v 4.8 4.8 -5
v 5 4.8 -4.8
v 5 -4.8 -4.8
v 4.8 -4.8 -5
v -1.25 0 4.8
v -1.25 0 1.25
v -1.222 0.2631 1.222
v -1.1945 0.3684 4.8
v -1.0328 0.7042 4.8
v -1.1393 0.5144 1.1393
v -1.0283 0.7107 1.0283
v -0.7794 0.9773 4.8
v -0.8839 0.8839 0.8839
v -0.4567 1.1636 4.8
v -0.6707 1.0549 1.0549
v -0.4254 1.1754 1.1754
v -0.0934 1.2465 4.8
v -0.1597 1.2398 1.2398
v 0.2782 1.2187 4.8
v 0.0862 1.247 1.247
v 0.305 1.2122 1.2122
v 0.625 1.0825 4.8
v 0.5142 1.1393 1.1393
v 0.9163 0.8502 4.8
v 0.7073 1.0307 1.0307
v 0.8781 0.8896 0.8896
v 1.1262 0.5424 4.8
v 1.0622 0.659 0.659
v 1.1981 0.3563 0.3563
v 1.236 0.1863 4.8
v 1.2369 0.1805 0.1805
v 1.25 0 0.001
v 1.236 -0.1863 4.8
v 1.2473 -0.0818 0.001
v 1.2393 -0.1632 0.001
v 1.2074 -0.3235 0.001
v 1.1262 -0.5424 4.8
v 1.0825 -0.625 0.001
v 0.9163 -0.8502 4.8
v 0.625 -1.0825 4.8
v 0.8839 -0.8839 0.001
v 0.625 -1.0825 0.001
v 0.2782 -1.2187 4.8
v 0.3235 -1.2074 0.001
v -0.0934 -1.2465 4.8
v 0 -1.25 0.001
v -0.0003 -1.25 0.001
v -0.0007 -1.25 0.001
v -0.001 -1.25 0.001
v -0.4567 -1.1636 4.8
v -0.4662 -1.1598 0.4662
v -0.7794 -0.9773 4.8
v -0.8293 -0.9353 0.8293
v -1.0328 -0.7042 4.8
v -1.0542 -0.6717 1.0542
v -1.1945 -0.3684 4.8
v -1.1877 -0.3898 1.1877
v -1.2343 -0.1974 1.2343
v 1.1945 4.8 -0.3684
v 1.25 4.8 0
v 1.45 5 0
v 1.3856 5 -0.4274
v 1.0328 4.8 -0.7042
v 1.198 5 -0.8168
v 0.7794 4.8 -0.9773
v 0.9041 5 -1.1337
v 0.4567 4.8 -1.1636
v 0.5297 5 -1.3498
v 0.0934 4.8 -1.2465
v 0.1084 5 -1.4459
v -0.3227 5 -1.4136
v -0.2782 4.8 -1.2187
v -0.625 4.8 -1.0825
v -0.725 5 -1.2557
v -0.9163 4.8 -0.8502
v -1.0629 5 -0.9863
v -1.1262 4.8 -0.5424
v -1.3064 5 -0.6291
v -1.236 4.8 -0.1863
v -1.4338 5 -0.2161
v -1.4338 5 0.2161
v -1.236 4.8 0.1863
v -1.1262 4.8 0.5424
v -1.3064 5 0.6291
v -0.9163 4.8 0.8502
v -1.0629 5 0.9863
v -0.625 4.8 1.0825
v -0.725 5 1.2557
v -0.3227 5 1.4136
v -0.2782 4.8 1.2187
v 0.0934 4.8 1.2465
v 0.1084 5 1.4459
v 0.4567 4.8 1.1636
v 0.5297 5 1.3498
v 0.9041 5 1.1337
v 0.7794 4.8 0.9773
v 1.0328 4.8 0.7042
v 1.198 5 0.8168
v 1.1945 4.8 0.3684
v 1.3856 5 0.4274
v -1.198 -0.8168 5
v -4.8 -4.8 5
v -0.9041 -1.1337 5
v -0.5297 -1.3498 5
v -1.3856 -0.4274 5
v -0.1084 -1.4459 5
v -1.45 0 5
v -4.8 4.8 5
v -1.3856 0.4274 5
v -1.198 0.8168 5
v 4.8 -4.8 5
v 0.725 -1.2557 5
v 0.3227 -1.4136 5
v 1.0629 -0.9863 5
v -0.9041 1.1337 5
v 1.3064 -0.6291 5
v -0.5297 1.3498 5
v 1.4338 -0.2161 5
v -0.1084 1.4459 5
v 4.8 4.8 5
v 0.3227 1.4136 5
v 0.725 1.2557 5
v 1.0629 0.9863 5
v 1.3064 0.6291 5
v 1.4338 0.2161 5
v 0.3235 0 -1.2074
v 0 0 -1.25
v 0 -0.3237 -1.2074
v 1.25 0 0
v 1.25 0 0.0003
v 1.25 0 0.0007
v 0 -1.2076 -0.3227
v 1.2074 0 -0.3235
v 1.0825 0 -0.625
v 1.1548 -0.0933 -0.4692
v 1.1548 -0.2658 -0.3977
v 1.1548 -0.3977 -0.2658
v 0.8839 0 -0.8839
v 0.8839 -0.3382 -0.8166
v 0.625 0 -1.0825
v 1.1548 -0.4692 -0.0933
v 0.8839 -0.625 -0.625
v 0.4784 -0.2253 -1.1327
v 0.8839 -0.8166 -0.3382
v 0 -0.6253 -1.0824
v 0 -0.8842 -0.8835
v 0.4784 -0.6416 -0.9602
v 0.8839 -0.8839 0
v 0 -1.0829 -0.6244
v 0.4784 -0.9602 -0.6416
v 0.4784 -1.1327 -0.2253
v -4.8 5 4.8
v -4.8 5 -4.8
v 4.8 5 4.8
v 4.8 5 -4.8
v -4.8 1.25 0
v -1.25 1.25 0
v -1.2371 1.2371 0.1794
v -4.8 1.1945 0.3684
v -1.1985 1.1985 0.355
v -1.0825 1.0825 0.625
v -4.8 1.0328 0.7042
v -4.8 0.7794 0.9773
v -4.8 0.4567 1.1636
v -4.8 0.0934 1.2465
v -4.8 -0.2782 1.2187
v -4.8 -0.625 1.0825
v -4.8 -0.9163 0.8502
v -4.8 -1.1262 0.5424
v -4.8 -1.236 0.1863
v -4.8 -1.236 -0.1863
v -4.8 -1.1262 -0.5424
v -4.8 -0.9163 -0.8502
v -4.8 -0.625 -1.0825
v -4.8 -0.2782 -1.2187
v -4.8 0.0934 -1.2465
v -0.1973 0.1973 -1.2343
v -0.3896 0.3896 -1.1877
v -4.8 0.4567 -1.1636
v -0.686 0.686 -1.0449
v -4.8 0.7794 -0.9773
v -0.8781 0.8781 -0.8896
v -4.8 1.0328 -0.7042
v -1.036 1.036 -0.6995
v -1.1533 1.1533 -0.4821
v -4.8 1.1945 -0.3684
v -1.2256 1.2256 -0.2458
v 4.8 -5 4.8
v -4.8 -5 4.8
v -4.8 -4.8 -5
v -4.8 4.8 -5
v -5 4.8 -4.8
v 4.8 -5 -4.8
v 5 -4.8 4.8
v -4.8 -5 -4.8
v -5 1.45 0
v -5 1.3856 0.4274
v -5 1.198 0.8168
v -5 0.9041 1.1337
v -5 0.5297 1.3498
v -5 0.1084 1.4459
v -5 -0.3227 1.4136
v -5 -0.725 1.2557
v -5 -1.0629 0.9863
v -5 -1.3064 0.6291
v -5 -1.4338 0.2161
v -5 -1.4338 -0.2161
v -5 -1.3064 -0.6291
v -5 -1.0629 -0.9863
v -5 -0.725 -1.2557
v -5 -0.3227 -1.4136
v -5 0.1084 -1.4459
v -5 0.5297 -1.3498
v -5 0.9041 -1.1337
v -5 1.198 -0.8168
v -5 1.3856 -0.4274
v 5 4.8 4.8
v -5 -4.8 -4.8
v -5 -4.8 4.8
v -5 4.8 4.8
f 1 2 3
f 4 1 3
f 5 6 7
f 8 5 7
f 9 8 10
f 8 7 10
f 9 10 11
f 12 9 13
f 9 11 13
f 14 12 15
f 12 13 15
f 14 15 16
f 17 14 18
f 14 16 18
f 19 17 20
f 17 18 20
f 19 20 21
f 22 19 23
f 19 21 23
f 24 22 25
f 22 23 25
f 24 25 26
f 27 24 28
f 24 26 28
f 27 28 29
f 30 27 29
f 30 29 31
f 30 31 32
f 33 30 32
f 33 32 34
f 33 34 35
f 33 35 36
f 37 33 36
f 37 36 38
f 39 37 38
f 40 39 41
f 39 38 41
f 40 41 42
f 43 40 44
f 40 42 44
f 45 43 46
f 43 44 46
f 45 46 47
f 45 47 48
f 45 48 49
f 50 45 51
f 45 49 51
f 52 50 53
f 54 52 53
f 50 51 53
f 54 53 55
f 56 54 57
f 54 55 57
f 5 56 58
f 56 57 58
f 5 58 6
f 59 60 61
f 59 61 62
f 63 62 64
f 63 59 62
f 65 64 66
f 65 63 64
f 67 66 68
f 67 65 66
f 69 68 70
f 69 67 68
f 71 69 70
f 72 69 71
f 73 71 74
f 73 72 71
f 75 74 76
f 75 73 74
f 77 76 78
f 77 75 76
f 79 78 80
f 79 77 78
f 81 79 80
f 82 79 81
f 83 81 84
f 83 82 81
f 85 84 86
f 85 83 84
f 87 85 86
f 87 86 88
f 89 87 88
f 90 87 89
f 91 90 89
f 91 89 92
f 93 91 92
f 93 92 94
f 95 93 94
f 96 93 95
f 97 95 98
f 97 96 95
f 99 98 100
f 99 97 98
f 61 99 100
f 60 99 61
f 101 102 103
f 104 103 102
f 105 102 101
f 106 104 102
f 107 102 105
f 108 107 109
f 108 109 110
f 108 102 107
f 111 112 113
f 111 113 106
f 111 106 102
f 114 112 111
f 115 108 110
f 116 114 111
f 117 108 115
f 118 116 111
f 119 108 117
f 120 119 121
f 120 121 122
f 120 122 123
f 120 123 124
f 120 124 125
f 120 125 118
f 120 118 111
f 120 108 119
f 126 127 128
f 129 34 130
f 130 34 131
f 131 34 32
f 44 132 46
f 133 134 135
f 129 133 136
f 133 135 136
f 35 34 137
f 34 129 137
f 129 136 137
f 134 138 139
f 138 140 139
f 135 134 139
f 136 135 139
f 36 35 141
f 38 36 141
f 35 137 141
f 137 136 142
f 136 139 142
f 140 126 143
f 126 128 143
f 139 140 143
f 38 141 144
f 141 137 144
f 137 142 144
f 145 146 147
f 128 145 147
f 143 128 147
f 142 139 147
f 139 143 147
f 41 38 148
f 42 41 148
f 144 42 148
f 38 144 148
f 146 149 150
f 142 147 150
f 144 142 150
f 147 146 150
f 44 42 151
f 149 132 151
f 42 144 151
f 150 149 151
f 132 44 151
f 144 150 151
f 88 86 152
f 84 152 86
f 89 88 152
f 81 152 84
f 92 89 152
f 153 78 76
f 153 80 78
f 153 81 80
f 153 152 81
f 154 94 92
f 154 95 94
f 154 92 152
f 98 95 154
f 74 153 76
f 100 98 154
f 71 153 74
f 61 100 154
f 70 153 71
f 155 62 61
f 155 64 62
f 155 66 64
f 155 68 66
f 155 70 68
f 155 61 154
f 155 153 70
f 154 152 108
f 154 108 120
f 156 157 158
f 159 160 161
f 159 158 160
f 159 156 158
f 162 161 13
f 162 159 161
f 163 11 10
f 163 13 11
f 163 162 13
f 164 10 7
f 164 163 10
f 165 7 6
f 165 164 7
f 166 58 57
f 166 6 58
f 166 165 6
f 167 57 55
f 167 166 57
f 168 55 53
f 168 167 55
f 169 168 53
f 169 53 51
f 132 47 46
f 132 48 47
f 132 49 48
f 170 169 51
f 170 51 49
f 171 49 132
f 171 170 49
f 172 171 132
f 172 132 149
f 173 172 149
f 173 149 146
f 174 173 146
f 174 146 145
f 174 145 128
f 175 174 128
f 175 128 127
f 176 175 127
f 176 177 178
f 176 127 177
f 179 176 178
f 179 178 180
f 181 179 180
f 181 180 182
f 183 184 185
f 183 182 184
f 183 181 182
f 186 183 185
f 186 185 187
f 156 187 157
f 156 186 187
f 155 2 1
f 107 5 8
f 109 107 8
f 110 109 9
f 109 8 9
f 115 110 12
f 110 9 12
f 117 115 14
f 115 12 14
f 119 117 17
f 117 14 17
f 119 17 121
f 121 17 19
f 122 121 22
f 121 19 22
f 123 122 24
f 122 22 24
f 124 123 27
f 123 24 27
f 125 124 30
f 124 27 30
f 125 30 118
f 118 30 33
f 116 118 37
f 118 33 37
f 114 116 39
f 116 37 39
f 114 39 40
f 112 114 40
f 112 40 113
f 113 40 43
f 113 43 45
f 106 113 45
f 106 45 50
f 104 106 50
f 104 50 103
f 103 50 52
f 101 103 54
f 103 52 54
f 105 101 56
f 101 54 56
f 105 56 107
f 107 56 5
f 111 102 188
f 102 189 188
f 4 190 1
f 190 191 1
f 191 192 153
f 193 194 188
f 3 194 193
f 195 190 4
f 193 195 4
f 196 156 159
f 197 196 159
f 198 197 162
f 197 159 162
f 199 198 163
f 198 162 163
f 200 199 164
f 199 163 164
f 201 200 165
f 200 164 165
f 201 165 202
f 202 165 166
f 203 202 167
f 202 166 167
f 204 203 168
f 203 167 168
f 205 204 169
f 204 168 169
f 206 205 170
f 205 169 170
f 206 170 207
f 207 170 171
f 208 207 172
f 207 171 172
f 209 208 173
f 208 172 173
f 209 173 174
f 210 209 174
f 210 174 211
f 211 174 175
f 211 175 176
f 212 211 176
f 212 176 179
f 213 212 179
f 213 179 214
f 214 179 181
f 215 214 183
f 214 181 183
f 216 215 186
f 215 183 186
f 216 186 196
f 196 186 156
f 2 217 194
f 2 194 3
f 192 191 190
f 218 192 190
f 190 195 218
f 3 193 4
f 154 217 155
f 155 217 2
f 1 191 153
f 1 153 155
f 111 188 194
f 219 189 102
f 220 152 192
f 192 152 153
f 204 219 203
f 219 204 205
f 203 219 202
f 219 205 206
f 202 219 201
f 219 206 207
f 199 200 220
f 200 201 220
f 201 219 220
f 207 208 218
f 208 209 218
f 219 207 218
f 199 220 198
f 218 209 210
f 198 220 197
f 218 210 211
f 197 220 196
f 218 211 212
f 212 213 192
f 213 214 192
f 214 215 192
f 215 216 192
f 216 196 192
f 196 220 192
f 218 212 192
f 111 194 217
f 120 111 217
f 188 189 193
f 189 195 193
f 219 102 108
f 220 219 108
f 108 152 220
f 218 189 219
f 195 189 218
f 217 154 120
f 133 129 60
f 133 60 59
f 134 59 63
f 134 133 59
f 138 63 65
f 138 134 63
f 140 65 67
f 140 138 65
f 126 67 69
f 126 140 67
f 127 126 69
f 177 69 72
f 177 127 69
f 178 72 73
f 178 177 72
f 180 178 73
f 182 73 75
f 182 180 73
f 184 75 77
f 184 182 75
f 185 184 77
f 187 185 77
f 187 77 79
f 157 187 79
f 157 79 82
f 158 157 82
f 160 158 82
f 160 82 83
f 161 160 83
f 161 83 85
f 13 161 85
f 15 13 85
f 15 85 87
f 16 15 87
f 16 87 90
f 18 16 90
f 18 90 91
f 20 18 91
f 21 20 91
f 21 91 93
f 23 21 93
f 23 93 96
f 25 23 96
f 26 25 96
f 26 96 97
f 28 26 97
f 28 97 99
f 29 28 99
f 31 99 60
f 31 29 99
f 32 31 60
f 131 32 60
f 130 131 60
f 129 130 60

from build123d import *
from OCP.BRepAlgoAPI import BRepAlgoAPI_Cut
from OCP.TopTools import TopTools_ListOfShape

# Parameters (mm, degrees)
SKETCH_1_W                 = 10
SKETCH_1_H                 = 10
EXTRUDE_1_DEPTH            = 5
HOLE_WIZARD_M3_1_D         = 2.5
HOLE_WIZARD_M3_1_DEPTH     = 4.999
HOLE_WIZARD_M3_2_OUTLINE_R = 1.25
HOLE_WIZARD_M3_2_DEPTH     = 5
HOLE_START                 = -5
HOLE_WIZARD_M3_3_OUTLINE_R = 1.25
HOLE_WIZARD_M3_3_DEPTH     = 5
CHAMFER_1_SIZE             = 0.2


with BuildPart() as part:
    # 草图1 → 凸台-拉伸1 (new, symmetric)
    with BuildSketch(Plane(origin=(0, 0, 0), x_dir=(1, 0, 0), z_dir=(0, 1, 0))):
        Rectangle(SKETCH_1_W, SKETCH_1_H)
    extrude(amount=EXTRUDE_1_DEPTH, both=True)

    # M3 螺纹孔1
    with Locations(Plane.XY.offset(5)):
        with Locations((0, 0)):
            Hole(HOLE_WIZARD_M3_1_D / 2, depth=HOLE_WIZARD_M3_1_DEPTH)


with BuildPart() as hole_wizard_m3_2_tool:
    # M3 螺纹孔2: read off the stored shape, not the designer's step
    # M3 螺纹孔2 outline → M3 螺纹孔2 (new body)
    with BuildSketch(Plane(origin=(0, 0, 0), x_dir=(1, 0, 0), z_dir=(0, 1, 0))):
        Circle(HOLE_WIZARD_M3_2_OUTLINE_R)
    extrude(amount=HOLE_WIZARD_M3_2_DEPTH)


with BuildPart() as part_1:
    add(part.part)

    # M3 螺纹孔2: cut by hole_wizard_m3_2_tool, with a tolerance
    hole_wizard_m3_2_stock = TopTools_ListOfShape()
    hole_wizard_m3_2_stock.Append(part_1.part.wrapped)
    hole_wizard_m3_2_tools = TopTools_ListOfShape()
    hole_wizard_m3_2_tools.Append(hole_wizard_m3_2_tool.part.wrapped)
    hole_wizard_m3_2_cut = BRepAlgoAPI_Cut()
    hole_wizard_m3_2_cut.SetArguments(hole_wizard_m3_2_stock)
    hole_wizard_m3_2_cut.SetTools(hole_wizard_m3_2_tools)
    hole_wizard_m3_2_cut.SetFuzzyValue(0.00001)
    hole_wizard_m3_2_cut.Build()
    add(Compound.cast(hole_wizard_m3_2_cut.Shape()).solids(), mode=Mode.REPLACE)

    # M3 螺纹孔3: read off the stored shape, not the designer's step
    # M3 螺纹孔3 outline → M3 螺纹孔3 (cut)
    with BuildSketch(Plane.YZ.offset(HOLE_START)):
        Circle(HOLE_WIZARD_M3_3_OUTLINE_R)
    extrude(amount=HOLE_WIZARD_M3_3_DEPTH, mode=Mode.SUBTRACT)

    # 草图7 → 切除-旋转1 (revolve, cut)
    with BuildSketch(Plane(origin=(0, 0, 0), x_dir=(1, 0, 0), z_dir=(0, 1, 0))):
        with BuildLine():
            Line((-1.25, 0), (1.25, 0))
            ThreePointArc((1.25, 0), (0, 1.25), (-1.25, 0))
        make_face()
    revolve(axis=Axis((0, 0, 0), (-1, 0, 0)), mode=Mode.SUBTRACT)

    # 倒角1
    chamfer_1_edges = [part_1.edges().sort_by_distance(p)[0] for p in [
        (-5, 5, 0),
        (1.25, 0, 5),
        (0, 5, 5),
        (-1.25, 5, 0),
        (-5, -1.25, 0),
        (5, 5, 0),
        (0, -5, 5),
        (-5, -5, 0),
        (0, -5, -5),
        (5, -5, 0),
        (5, 0, 5),
        (-5, 0, 5),
        (-5, 0, -5),
        (5, 0, -5),
        (0, 5, -5),
    ]]
    chamfer(chamfer_1_edges, length=CHAMFER_1_SIZE)


solid = part_1.part
